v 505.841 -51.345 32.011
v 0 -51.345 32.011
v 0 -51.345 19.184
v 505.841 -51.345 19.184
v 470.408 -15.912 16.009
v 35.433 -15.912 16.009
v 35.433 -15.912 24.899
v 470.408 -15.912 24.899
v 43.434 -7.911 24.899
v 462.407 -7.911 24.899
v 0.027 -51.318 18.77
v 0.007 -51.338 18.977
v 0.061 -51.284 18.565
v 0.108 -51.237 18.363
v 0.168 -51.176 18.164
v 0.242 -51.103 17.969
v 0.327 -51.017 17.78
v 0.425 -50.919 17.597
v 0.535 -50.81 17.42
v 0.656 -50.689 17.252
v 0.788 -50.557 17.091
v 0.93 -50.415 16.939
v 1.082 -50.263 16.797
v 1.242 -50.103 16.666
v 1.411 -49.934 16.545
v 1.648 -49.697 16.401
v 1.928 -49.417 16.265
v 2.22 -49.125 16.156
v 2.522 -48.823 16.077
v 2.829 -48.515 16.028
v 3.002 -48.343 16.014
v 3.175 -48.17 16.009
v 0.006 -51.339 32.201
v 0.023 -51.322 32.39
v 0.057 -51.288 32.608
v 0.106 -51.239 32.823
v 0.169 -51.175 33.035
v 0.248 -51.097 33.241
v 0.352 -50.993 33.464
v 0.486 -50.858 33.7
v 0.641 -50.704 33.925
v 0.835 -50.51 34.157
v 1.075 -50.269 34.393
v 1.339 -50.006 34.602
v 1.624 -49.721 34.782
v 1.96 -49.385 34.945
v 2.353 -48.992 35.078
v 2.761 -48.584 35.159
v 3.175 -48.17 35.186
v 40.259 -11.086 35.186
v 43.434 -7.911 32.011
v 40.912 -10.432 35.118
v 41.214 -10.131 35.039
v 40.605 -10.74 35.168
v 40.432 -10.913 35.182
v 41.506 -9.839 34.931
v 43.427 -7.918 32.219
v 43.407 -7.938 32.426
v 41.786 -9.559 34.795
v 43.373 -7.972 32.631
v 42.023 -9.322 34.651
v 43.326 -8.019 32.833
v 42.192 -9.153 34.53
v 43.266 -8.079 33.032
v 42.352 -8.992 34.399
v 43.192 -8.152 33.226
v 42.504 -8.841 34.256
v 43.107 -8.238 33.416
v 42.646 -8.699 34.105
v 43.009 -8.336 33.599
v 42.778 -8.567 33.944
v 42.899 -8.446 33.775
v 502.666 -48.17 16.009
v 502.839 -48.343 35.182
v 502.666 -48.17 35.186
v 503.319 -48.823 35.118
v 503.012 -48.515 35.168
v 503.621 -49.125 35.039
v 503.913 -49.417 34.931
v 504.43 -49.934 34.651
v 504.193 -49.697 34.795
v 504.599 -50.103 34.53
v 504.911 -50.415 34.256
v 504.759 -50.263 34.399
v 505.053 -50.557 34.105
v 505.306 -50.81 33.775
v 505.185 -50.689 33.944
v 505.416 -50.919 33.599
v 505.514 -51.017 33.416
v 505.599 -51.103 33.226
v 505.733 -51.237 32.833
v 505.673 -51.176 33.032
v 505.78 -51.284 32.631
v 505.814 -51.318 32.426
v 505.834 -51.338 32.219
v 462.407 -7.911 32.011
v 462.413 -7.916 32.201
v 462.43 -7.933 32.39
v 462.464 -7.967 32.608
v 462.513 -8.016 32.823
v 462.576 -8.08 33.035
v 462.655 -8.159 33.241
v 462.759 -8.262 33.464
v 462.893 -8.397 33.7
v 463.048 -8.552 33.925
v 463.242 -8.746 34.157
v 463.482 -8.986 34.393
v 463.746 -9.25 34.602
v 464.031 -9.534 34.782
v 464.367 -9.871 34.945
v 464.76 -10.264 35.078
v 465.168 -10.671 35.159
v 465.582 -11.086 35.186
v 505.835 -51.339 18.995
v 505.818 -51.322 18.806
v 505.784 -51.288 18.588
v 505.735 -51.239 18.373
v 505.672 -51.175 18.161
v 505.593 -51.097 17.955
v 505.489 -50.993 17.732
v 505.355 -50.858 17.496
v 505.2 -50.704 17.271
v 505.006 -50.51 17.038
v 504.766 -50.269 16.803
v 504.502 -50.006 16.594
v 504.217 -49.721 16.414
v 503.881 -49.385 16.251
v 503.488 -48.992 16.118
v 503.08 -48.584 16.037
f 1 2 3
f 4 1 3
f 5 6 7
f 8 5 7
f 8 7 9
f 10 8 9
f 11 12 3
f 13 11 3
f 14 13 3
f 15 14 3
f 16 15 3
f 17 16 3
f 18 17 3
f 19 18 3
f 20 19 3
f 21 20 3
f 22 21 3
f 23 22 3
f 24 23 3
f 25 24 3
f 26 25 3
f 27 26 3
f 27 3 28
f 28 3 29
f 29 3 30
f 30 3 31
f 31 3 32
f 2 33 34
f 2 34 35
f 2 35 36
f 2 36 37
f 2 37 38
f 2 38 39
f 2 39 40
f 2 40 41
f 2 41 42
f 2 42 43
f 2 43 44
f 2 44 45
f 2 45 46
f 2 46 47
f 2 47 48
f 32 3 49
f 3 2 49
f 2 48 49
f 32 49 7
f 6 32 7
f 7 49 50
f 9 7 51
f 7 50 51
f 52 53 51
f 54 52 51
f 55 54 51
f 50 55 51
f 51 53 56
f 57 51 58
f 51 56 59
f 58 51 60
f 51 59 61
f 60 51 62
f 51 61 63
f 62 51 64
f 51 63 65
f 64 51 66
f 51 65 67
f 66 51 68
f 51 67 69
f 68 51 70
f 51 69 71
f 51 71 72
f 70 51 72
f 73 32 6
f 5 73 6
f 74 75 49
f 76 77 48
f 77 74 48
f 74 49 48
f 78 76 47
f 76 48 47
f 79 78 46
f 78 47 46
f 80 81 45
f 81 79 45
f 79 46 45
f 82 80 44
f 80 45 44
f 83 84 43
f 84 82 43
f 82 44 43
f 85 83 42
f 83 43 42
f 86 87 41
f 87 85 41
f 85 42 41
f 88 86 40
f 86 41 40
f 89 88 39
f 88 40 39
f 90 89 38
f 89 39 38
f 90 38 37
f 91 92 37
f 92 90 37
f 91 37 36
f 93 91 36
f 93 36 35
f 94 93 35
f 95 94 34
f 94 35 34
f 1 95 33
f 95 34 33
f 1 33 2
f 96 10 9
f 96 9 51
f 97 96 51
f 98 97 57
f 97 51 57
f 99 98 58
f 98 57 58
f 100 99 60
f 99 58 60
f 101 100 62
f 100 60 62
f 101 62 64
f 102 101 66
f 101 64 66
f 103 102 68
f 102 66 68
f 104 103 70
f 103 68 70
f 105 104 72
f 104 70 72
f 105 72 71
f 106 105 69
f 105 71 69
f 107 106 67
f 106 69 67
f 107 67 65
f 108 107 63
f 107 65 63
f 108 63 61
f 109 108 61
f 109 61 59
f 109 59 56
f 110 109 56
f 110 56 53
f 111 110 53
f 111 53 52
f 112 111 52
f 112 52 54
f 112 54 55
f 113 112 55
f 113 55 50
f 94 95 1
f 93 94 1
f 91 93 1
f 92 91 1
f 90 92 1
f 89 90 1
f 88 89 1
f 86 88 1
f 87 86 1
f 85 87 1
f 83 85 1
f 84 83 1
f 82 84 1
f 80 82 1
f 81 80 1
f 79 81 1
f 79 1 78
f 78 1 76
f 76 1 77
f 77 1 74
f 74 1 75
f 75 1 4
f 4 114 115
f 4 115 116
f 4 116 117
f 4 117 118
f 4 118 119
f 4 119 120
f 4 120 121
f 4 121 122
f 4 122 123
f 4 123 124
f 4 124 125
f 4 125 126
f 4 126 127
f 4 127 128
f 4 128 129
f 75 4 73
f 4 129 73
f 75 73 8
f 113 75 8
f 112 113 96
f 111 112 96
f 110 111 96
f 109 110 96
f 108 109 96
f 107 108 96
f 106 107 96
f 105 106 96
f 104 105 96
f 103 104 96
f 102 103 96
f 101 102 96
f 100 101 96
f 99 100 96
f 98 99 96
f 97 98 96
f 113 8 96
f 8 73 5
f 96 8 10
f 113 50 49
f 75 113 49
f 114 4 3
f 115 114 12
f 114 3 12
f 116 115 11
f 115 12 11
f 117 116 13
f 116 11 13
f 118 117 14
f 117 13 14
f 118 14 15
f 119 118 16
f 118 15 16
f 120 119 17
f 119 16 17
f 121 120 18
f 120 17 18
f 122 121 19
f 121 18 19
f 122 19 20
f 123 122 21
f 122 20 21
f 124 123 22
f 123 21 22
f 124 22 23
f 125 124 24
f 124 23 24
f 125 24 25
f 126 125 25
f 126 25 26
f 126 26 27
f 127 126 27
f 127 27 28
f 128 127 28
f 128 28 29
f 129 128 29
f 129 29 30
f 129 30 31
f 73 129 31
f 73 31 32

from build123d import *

# Parameters (mm, degrees)
F1_DEPTH = 558.8
F3_DEPTH = 19.178
F5_DEPTH = 19.178
F7_DEPTH = 19.178


with BuildPart() as f1:
    # F0 (on Right) → F1 (new body)
    with BuildSketch(Plane.YZ):
        with BuildLine():
            Line((-11.0857636662, 35.1864280597), (-48.1697636662, 35.1864280597))
            ThreePointArc((-48.1697636662, 35.1864280597), (-50.4148276965, 34.25649209), (-51.3447636662, 32.0114280597))
            Line((-51.3447636662, 32.0114280597), (-51.3447636662, 19.1844280597))
            ThreePointArc((-51.3447636662, 19.1844280597), (-50.4148276965, 16.9393640294), (-48.1697636662, 16.0094280597))
            Line((-48.1697636662, 16.0094280597), (-15.9117636662, 16.0094280597))
            Line((-15.9117636662, 16.0094280597), (-15.9117636662, 24.8994280597))
            Line((-15.9117636662, 24.8994280597), (-7.9107636662, 24.8994280597))
            Line((-7.9107636662, 24.8994280597), (-7.9107636662, 32.0114280597))
            ThreePointArc((-7.9107636662, 32.0114280597), (-8.8406996359, 34.25649209), (-11.0857636662, 35.1864280597))
        make_face()
    extrude(amount=F1_DEPTH)

    # F2 (on face) → F3 (cut, through all)
    with BuildSketch(Plane.XY.offset(35.1864280597)):
        Polygon((0, -11.0857636662), (40.259, -11.0857636662), (43.434, -7.9107636662), (0, -7.9107636662), align=None)
        Polygon((0, -48.1697636662), (3.175, -48.1697636662), (40.259, -11.0857636662), (0, -11.0857636662), align=None)
        Polygon((0, -48.1697636662), (0, -51.3447636662), (3.175, -48.1697636662), align=None)
    extrude(amount=-F3_DEPTH, mode=Mode.SUBTRACT)

    # F4 (on face) → F5 (cut, through all)
    with BuildSketch(Plane(origin=(0, 0, 16.0094280597), x_dir=(1, 0, 0), z_dir=(0, 0, -1))):
        Polygon((558.8, 48.1697636662), (558.8, 51.3447636662), (521.843, 51.3447636662), (518.668, 48.1697636662), align=None)
        Polygon((558.8, 15.9117636662), (558.8, 48.1697636662), (518.668, 48.1697636662), (486.41, 15.9117636662), align=None)
        Polygon((558.8, 7.9107636662), (558.8, 15.9117636662), (486.41, 15.9117636662), (478.409, 7.9107636662), align=None)
    extrude(amount=-F5_DEPTH, mode=Mode.SUBTRACT)

    # F6 (on face) → F7 (cut, through all)
    with BuildSketch(Plane(origin=(0, 0, 16.0094280597), x_dir=(1, 0, 0), z_dir=(0, 0, -1))):
        Polygon((470.408, 15.9117636662), (470.408, 15.5282095075), (470.408, 14.7099299356), (470.408, 7.9107636662), (478.409, 7.9107636662), (486.41, 15.9117636662), align=None)
        Polygon((470.408, 14.7099299356), (470.408, 15.5282095075), (470.408, 15.9117636662), (462.407, 7.9107636662), (470.408, 7.9107636662), align=None)
        Polygon((502.666, 48.1697636662), (470.408, 15.9117636662), (486.41, 15.9117636662), (518.668, 48.1697636662), align=None)
        Polygon((505.841, 51.3447636662), (502.666, 48.1697636662), (518.668, 48.1697636662), (521.843, 51.3447636662), align=None)
    extrude(amount=-F7_DEPTH, mode=Mode.SUBTRACT)


solid = f1.part
